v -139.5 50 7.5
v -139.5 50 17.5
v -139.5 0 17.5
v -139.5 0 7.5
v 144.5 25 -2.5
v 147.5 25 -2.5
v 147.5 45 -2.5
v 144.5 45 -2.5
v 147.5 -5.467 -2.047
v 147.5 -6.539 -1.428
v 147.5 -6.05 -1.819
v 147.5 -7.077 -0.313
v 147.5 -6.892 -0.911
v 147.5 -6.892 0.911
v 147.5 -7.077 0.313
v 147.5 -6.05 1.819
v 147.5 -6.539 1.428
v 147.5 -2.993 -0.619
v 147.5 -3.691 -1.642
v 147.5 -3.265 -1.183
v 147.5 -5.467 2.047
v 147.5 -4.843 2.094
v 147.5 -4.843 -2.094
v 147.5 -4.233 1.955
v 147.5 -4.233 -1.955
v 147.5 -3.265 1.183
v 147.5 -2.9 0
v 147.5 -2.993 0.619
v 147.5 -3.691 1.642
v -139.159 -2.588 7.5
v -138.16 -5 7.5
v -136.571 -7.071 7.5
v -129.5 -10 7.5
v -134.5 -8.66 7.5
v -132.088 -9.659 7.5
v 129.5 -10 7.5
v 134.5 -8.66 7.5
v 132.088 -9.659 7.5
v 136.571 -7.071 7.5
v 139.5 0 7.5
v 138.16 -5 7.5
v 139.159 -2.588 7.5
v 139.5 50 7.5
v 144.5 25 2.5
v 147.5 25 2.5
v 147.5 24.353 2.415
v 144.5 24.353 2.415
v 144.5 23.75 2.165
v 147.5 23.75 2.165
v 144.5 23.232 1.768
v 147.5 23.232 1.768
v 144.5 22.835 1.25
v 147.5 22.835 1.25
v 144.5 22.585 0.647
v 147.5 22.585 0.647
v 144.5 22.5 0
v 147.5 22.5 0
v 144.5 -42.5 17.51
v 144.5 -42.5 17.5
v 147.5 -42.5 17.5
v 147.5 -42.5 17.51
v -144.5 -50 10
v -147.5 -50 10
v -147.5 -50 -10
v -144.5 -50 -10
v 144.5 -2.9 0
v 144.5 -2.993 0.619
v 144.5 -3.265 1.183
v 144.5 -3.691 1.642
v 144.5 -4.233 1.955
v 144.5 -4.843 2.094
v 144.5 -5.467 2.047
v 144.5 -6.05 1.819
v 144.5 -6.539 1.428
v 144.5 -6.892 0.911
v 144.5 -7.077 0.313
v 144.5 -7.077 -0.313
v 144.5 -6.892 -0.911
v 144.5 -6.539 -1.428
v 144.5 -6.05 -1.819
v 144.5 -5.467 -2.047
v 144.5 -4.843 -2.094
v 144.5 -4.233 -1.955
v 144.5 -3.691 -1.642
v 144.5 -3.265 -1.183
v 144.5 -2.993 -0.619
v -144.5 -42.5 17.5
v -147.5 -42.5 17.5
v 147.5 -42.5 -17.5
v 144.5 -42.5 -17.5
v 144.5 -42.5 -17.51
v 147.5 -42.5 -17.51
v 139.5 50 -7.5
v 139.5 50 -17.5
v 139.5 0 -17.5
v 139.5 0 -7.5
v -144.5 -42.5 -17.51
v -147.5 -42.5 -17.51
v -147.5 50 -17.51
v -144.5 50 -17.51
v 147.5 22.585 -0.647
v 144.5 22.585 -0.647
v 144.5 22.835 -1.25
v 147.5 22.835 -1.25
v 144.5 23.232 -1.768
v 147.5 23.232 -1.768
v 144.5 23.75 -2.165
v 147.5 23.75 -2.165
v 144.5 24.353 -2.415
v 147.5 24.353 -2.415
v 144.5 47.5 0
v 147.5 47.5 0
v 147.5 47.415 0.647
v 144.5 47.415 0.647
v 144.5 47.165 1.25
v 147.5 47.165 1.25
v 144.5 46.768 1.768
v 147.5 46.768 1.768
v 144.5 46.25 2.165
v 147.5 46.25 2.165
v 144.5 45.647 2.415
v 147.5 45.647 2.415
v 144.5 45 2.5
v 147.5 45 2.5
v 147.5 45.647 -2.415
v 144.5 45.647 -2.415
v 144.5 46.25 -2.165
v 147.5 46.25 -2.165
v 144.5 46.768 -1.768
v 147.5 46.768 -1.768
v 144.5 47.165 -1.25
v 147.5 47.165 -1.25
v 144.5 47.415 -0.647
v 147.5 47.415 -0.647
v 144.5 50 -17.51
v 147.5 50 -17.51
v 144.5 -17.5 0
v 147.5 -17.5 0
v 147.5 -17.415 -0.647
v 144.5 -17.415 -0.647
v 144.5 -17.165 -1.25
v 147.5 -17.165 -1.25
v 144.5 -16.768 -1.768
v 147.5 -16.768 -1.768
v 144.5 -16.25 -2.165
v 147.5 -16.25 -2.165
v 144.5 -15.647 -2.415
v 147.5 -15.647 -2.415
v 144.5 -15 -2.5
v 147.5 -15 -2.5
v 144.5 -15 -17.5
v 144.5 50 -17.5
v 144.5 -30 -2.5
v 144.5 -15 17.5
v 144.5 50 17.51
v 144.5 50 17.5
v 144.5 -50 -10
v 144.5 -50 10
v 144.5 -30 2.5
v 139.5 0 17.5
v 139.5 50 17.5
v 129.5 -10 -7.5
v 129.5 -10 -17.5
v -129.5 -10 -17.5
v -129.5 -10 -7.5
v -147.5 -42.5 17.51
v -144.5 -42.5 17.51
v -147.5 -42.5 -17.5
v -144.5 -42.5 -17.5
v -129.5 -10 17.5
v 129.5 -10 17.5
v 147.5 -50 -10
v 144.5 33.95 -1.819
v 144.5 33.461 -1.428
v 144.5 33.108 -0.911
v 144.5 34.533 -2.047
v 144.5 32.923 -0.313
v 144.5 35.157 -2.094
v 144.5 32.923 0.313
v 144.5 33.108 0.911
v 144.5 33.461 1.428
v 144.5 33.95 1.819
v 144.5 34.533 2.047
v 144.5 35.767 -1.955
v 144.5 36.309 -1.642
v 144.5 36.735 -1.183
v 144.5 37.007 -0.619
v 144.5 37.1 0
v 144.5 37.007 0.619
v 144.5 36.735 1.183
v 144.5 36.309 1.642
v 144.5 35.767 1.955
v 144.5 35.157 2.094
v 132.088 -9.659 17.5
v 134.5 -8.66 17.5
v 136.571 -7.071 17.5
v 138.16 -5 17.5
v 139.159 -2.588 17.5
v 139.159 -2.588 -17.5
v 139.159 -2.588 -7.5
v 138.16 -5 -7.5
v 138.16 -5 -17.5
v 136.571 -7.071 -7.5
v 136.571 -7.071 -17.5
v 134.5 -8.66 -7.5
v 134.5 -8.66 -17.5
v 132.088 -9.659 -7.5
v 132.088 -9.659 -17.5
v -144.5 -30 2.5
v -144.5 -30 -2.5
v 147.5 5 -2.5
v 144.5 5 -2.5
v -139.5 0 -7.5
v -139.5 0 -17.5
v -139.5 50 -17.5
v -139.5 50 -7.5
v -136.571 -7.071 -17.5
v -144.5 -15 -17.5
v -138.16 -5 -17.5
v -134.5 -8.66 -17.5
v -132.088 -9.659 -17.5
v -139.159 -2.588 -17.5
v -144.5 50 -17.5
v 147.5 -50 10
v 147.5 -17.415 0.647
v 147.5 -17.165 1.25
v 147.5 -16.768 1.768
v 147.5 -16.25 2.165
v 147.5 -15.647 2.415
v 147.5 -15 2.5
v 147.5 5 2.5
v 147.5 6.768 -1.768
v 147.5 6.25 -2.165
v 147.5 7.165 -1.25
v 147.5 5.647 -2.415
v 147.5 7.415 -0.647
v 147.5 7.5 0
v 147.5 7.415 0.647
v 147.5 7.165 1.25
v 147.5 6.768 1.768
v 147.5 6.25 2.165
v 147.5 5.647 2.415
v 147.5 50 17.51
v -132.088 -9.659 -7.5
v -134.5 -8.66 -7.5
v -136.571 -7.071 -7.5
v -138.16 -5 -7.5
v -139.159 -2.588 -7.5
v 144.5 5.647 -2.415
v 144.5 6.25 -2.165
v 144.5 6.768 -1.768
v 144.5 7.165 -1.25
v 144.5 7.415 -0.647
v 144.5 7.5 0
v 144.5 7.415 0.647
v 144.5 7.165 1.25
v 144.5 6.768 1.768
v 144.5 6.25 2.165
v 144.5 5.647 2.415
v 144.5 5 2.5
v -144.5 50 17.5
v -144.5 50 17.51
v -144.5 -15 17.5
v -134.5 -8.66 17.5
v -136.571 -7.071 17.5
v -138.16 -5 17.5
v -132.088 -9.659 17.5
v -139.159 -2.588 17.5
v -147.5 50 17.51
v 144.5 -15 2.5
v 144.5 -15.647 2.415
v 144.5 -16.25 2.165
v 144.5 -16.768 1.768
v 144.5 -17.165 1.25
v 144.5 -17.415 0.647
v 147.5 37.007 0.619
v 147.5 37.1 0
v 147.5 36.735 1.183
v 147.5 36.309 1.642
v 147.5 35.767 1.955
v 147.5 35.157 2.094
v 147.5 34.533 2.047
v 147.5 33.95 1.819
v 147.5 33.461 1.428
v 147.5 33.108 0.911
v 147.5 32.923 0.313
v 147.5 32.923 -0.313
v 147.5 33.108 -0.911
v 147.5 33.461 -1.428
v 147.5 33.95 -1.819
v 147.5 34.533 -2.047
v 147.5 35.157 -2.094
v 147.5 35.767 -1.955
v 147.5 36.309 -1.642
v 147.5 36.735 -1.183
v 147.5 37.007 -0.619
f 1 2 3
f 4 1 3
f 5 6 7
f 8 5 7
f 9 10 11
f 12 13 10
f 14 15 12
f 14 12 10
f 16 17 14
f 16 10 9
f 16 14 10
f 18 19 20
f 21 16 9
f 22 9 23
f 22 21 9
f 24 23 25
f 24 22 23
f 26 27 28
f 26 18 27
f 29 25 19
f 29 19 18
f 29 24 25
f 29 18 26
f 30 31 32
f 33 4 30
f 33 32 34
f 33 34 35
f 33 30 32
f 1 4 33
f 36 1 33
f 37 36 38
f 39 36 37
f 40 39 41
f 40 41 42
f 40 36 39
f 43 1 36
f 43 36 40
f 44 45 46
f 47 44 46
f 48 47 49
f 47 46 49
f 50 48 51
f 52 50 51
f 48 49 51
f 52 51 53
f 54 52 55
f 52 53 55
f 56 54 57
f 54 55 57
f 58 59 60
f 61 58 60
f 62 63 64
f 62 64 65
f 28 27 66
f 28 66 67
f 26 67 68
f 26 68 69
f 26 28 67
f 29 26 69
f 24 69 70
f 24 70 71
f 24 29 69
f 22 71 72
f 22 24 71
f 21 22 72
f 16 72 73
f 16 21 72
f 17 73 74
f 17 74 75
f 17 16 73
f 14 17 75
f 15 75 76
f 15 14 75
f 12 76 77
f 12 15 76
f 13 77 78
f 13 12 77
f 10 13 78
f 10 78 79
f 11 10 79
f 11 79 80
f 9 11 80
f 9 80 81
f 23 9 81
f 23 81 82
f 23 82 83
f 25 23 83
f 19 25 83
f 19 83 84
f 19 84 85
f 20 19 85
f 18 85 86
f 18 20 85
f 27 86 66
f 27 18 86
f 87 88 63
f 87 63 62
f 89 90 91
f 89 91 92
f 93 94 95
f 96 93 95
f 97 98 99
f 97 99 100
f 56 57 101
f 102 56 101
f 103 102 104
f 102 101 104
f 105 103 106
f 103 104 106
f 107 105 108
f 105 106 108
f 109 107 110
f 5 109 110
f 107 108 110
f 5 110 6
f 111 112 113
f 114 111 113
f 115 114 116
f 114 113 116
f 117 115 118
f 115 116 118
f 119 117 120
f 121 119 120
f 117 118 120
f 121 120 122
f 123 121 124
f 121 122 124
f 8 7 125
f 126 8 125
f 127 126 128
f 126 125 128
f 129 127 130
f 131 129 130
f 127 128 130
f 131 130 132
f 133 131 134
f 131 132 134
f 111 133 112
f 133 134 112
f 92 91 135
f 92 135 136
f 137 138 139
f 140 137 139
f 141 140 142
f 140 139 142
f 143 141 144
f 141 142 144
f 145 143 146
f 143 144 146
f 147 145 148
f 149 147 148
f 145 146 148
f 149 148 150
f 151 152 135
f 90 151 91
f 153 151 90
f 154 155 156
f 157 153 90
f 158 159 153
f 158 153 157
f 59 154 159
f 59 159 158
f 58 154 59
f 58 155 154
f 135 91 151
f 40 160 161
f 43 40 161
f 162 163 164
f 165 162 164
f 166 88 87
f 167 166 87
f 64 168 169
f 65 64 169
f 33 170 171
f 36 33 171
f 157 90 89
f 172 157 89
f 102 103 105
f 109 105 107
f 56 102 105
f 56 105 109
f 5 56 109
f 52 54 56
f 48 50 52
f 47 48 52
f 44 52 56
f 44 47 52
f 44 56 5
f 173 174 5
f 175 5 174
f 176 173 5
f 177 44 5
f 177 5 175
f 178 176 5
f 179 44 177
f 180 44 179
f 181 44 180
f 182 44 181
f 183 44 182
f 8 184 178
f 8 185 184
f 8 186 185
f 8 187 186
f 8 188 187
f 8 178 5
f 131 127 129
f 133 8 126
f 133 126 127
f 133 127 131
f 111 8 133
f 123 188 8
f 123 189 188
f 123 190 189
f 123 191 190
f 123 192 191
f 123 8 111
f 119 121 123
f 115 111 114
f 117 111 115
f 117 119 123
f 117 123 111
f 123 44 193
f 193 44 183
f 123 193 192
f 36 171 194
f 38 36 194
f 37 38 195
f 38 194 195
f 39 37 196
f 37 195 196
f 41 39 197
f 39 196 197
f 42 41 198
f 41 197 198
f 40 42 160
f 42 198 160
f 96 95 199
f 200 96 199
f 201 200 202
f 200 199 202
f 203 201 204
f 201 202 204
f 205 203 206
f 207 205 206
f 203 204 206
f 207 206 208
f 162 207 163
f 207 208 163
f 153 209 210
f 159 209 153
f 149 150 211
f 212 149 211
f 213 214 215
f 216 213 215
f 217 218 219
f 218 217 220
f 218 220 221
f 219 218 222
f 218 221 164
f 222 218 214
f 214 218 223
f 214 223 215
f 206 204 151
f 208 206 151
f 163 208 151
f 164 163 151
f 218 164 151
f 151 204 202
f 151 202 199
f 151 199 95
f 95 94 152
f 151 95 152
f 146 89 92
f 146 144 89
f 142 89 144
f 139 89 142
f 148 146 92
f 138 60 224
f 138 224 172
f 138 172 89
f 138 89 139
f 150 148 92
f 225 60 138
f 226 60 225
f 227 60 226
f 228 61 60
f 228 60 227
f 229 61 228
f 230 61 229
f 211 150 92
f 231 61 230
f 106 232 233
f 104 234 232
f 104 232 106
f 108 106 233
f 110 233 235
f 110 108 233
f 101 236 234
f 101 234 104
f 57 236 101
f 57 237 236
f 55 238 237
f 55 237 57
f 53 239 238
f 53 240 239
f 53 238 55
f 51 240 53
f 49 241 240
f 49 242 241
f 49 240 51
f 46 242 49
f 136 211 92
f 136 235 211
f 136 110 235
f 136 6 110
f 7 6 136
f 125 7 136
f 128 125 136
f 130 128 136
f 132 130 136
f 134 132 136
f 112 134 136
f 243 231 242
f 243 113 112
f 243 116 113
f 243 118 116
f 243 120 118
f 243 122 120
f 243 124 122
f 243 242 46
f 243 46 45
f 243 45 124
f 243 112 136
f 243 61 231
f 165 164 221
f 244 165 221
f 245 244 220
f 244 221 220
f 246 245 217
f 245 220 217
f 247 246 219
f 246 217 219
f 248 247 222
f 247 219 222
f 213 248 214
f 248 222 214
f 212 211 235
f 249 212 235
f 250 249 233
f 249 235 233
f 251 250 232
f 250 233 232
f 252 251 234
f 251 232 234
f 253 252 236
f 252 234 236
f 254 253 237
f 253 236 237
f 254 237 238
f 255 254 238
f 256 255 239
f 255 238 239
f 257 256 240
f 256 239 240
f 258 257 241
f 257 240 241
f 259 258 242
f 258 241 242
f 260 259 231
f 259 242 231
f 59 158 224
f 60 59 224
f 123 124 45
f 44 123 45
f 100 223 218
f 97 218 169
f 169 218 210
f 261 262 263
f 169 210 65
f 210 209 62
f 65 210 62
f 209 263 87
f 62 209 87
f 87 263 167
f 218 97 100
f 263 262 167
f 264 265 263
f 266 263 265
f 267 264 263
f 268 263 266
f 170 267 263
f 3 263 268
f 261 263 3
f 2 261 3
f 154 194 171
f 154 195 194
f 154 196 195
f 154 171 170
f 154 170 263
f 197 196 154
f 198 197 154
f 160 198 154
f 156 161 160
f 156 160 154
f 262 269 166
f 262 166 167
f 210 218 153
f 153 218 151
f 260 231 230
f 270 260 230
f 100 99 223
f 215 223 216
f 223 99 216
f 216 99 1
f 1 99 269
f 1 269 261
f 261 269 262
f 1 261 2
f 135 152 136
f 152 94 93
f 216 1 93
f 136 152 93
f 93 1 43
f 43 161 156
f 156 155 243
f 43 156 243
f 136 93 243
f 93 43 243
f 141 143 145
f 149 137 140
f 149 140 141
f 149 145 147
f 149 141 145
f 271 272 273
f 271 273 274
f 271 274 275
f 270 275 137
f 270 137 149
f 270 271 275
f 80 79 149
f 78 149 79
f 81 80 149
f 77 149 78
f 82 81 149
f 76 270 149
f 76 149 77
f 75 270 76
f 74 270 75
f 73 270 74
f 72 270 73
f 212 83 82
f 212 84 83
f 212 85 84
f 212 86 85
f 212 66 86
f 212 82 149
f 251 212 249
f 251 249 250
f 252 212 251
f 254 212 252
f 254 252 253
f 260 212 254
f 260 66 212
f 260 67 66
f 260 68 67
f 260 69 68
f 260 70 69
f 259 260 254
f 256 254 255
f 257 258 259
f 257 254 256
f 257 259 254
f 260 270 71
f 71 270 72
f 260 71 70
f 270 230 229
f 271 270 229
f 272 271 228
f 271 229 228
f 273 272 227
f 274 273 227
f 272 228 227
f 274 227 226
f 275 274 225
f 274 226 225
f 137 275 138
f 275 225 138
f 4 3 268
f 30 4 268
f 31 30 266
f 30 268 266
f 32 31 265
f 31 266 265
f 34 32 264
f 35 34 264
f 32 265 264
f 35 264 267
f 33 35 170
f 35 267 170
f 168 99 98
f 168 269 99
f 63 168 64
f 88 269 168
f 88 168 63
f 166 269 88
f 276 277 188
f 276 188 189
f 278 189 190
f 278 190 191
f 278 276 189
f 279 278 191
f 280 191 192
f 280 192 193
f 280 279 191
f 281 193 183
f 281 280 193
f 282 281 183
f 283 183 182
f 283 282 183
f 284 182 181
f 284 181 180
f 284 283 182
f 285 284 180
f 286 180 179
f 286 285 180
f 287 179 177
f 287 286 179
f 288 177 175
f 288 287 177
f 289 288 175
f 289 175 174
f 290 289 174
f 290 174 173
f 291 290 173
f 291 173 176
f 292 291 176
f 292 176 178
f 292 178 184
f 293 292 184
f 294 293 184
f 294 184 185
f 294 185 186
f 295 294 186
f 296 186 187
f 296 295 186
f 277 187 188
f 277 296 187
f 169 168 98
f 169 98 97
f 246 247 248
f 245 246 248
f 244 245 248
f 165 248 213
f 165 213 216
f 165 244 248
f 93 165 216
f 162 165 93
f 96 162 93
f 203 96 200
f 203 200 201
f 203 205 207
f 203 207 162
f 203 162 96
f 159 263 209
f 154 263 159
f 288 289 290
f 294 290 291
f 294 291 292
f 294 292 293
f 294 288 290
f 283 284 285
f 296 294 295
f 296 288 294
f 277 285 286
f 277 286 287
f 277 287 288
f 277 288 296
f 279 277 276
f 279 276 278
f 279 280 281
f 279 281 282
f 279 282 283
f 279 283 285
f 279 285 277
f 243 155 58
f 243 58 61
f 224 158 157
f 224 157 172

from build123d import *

# Parameters (mm, degrees)
F1_DEPTH      = 17.5
F1_DEPTH_BACK = 17.5
F2_SIZE       = 15
F3_SIZE       = 7.5
F5_W          = 3
F5_H          = 92.5
F6_DEPTH      = 0.01
F7_W          = 3
F7_H          = 92.5
F8_DEPTH      = 0.01
F4_R          = 2.1
F9_DEPTH      = 3
F11_DEPTH     = 10
F13_DEPTH     = 10


with BuildPart() as f1:
    # F0 (on Top) → F1 (new body, two sides)
    with BuildSketch(Plane.XY) as f1_sk:
        Polygon((147.5, -50), (147.5, 50), (-147.5, 50), (-147.5, -50), (-144.5, -50), (-144.5, -30), (144.5, -30), (144.5, -50), align=None)
    extrude(amount=F1_DEPTH)
    extrude(f1_sk.sketch, amount=-F1_DEPTH_BACK)

    # F2
    f2_edges = [f1.edges().sort_by_distance(p)[0] for p in [
        (0, -30, 17.5),
        (0, -30, -17.5),
    ]]
    chamfer(f2_edges, length=F2_SIZE)

    # F3
    f3_edges = [f1.edges().sort_by_distance(p)[0] for p in [
        (146, -50, 17.5),
        (146, -50, -17.5),
        (-146, -50, 17.5),
        (-146, -50, -17.5),
    ]]
    chamfer(f3_edges, length=F3_SIZE)

    # F5 (on face) → F6 (join)
    with BuildSketch(Plane.XY.offset(17.5)):
        with Locations((-146, 3.75)):
            Rectangle(F5_W, F5_H)
        with Locations((146, 3.75)):
            Rectangle(F5_W, F5_H)
    extrude(amount=F6_DEPTH)

    # F7 (on face) → F8 (join)
    with BuildSketch(Plane(origin=(0, 0, -17.5), x_dir=(1, 0, 0), z_dir=(0, 0, -1))):
        with Locations((-146, -3.75)):
            Rectangle(F7_W, F7_H)
        with Locations((146, -3.75)):
            Rectangle(F7_W, F7_H)
    extrude(amount=F8_DEPTH)

    # F4 (on face) → F9 (cut)
    with BuildSketch(Plane.YZ.offset(147.5)):
        with BuildLine():
            ThreePointArc((47.5, 0), (46.767767, 1.767767), (45, 2.5))
            Line((45, 2.5), (25, 2.5))
            ThreePointArc((25, 2.5), (23.232233, 1.767767), (22.5, 0))
            ThreePointArc((22.5, 0), (23.232233, -1.767767), (25, -2.5))
            Line((25, -2.5), (45, -2.5))
            ThreePointArc((45, -2.5), (46.767767, -1.767767), (47.5, 0))
        make_face()
        with Locations((35, 0)):
            Circle(F4_R, mode=Mode.SUBTRACT)
        with BuildLine():
            ThreePointArc((7.5, 0), (6.767767, 1.767767), (5, 2.5))
            Line((5, 2.5), (-15, 2.5))
            ThreePointArc((-15, 2.5), (-16.767767, 1.767767), (-17.5, 0))
            ThreePointArc((-17.5, 0), (-16.767767, -1.767767), (-15, -2.5))
            Line((-15, -2.5), (5, -2.5))
            ThreePointArc((5, -2.5), (6.767767, -1.767767), (7.5, 0))
        make_face()
        with Locations((-5, 0)):
            Circle(F4_R, mode=Mode.SUBTRACT)
    extrude(amount=-F9_DEPTH, mode=Mode.SUBTRACT)

    # F10 (on face) → F11 (cut)
    with BuildSketch(Plane.XY.offset(17.5)):
        with BuildLine():
            Line((139.5, 50), (-139.5, 50))
            Line((-139.5, 50), (-139.5, 0))
            ThreePointArc((-139.5, 0), (-136.571068, -7.071068), (-129.5, -10))
            Line((-129.5, -10), (129.5, -10))
            ThreePointArc((129.5, -10), (136.571068, -7.071068), (139.5, 0))
            Line((139.5, 0), (139.5, 50))
        make_face()
    extrude(amount=-F11_DEPTH, mode=Mode.SUBTRACT)

    # F12 (on face) → F13 (cut)
    with BuildSketch(Plane(origin=(0, 0, -17.5), x_dir=(1, 0, 0), z_dir=(0, 0, -1))):
        with BuildLine():
            Line((139.5, -50), (139.5, 0))
            ThreePointArc((139.5, 0), (136.571068, 7.071068), (129.5, 10))
            Line((129.5, 10), (-129.5, 10))
            ThreePointArc((-129.5, 10), (-136.571068, 7.071068), (-139.5, 0))
            Line((-139.5, 0), (-139.5, -50))
            Line((-139.5, -50), (139.5, -50))
        make_face()
    extrude(amount=-F13_DEPTH, mode=Mode.SUBTRACT)


solid = f1.part
